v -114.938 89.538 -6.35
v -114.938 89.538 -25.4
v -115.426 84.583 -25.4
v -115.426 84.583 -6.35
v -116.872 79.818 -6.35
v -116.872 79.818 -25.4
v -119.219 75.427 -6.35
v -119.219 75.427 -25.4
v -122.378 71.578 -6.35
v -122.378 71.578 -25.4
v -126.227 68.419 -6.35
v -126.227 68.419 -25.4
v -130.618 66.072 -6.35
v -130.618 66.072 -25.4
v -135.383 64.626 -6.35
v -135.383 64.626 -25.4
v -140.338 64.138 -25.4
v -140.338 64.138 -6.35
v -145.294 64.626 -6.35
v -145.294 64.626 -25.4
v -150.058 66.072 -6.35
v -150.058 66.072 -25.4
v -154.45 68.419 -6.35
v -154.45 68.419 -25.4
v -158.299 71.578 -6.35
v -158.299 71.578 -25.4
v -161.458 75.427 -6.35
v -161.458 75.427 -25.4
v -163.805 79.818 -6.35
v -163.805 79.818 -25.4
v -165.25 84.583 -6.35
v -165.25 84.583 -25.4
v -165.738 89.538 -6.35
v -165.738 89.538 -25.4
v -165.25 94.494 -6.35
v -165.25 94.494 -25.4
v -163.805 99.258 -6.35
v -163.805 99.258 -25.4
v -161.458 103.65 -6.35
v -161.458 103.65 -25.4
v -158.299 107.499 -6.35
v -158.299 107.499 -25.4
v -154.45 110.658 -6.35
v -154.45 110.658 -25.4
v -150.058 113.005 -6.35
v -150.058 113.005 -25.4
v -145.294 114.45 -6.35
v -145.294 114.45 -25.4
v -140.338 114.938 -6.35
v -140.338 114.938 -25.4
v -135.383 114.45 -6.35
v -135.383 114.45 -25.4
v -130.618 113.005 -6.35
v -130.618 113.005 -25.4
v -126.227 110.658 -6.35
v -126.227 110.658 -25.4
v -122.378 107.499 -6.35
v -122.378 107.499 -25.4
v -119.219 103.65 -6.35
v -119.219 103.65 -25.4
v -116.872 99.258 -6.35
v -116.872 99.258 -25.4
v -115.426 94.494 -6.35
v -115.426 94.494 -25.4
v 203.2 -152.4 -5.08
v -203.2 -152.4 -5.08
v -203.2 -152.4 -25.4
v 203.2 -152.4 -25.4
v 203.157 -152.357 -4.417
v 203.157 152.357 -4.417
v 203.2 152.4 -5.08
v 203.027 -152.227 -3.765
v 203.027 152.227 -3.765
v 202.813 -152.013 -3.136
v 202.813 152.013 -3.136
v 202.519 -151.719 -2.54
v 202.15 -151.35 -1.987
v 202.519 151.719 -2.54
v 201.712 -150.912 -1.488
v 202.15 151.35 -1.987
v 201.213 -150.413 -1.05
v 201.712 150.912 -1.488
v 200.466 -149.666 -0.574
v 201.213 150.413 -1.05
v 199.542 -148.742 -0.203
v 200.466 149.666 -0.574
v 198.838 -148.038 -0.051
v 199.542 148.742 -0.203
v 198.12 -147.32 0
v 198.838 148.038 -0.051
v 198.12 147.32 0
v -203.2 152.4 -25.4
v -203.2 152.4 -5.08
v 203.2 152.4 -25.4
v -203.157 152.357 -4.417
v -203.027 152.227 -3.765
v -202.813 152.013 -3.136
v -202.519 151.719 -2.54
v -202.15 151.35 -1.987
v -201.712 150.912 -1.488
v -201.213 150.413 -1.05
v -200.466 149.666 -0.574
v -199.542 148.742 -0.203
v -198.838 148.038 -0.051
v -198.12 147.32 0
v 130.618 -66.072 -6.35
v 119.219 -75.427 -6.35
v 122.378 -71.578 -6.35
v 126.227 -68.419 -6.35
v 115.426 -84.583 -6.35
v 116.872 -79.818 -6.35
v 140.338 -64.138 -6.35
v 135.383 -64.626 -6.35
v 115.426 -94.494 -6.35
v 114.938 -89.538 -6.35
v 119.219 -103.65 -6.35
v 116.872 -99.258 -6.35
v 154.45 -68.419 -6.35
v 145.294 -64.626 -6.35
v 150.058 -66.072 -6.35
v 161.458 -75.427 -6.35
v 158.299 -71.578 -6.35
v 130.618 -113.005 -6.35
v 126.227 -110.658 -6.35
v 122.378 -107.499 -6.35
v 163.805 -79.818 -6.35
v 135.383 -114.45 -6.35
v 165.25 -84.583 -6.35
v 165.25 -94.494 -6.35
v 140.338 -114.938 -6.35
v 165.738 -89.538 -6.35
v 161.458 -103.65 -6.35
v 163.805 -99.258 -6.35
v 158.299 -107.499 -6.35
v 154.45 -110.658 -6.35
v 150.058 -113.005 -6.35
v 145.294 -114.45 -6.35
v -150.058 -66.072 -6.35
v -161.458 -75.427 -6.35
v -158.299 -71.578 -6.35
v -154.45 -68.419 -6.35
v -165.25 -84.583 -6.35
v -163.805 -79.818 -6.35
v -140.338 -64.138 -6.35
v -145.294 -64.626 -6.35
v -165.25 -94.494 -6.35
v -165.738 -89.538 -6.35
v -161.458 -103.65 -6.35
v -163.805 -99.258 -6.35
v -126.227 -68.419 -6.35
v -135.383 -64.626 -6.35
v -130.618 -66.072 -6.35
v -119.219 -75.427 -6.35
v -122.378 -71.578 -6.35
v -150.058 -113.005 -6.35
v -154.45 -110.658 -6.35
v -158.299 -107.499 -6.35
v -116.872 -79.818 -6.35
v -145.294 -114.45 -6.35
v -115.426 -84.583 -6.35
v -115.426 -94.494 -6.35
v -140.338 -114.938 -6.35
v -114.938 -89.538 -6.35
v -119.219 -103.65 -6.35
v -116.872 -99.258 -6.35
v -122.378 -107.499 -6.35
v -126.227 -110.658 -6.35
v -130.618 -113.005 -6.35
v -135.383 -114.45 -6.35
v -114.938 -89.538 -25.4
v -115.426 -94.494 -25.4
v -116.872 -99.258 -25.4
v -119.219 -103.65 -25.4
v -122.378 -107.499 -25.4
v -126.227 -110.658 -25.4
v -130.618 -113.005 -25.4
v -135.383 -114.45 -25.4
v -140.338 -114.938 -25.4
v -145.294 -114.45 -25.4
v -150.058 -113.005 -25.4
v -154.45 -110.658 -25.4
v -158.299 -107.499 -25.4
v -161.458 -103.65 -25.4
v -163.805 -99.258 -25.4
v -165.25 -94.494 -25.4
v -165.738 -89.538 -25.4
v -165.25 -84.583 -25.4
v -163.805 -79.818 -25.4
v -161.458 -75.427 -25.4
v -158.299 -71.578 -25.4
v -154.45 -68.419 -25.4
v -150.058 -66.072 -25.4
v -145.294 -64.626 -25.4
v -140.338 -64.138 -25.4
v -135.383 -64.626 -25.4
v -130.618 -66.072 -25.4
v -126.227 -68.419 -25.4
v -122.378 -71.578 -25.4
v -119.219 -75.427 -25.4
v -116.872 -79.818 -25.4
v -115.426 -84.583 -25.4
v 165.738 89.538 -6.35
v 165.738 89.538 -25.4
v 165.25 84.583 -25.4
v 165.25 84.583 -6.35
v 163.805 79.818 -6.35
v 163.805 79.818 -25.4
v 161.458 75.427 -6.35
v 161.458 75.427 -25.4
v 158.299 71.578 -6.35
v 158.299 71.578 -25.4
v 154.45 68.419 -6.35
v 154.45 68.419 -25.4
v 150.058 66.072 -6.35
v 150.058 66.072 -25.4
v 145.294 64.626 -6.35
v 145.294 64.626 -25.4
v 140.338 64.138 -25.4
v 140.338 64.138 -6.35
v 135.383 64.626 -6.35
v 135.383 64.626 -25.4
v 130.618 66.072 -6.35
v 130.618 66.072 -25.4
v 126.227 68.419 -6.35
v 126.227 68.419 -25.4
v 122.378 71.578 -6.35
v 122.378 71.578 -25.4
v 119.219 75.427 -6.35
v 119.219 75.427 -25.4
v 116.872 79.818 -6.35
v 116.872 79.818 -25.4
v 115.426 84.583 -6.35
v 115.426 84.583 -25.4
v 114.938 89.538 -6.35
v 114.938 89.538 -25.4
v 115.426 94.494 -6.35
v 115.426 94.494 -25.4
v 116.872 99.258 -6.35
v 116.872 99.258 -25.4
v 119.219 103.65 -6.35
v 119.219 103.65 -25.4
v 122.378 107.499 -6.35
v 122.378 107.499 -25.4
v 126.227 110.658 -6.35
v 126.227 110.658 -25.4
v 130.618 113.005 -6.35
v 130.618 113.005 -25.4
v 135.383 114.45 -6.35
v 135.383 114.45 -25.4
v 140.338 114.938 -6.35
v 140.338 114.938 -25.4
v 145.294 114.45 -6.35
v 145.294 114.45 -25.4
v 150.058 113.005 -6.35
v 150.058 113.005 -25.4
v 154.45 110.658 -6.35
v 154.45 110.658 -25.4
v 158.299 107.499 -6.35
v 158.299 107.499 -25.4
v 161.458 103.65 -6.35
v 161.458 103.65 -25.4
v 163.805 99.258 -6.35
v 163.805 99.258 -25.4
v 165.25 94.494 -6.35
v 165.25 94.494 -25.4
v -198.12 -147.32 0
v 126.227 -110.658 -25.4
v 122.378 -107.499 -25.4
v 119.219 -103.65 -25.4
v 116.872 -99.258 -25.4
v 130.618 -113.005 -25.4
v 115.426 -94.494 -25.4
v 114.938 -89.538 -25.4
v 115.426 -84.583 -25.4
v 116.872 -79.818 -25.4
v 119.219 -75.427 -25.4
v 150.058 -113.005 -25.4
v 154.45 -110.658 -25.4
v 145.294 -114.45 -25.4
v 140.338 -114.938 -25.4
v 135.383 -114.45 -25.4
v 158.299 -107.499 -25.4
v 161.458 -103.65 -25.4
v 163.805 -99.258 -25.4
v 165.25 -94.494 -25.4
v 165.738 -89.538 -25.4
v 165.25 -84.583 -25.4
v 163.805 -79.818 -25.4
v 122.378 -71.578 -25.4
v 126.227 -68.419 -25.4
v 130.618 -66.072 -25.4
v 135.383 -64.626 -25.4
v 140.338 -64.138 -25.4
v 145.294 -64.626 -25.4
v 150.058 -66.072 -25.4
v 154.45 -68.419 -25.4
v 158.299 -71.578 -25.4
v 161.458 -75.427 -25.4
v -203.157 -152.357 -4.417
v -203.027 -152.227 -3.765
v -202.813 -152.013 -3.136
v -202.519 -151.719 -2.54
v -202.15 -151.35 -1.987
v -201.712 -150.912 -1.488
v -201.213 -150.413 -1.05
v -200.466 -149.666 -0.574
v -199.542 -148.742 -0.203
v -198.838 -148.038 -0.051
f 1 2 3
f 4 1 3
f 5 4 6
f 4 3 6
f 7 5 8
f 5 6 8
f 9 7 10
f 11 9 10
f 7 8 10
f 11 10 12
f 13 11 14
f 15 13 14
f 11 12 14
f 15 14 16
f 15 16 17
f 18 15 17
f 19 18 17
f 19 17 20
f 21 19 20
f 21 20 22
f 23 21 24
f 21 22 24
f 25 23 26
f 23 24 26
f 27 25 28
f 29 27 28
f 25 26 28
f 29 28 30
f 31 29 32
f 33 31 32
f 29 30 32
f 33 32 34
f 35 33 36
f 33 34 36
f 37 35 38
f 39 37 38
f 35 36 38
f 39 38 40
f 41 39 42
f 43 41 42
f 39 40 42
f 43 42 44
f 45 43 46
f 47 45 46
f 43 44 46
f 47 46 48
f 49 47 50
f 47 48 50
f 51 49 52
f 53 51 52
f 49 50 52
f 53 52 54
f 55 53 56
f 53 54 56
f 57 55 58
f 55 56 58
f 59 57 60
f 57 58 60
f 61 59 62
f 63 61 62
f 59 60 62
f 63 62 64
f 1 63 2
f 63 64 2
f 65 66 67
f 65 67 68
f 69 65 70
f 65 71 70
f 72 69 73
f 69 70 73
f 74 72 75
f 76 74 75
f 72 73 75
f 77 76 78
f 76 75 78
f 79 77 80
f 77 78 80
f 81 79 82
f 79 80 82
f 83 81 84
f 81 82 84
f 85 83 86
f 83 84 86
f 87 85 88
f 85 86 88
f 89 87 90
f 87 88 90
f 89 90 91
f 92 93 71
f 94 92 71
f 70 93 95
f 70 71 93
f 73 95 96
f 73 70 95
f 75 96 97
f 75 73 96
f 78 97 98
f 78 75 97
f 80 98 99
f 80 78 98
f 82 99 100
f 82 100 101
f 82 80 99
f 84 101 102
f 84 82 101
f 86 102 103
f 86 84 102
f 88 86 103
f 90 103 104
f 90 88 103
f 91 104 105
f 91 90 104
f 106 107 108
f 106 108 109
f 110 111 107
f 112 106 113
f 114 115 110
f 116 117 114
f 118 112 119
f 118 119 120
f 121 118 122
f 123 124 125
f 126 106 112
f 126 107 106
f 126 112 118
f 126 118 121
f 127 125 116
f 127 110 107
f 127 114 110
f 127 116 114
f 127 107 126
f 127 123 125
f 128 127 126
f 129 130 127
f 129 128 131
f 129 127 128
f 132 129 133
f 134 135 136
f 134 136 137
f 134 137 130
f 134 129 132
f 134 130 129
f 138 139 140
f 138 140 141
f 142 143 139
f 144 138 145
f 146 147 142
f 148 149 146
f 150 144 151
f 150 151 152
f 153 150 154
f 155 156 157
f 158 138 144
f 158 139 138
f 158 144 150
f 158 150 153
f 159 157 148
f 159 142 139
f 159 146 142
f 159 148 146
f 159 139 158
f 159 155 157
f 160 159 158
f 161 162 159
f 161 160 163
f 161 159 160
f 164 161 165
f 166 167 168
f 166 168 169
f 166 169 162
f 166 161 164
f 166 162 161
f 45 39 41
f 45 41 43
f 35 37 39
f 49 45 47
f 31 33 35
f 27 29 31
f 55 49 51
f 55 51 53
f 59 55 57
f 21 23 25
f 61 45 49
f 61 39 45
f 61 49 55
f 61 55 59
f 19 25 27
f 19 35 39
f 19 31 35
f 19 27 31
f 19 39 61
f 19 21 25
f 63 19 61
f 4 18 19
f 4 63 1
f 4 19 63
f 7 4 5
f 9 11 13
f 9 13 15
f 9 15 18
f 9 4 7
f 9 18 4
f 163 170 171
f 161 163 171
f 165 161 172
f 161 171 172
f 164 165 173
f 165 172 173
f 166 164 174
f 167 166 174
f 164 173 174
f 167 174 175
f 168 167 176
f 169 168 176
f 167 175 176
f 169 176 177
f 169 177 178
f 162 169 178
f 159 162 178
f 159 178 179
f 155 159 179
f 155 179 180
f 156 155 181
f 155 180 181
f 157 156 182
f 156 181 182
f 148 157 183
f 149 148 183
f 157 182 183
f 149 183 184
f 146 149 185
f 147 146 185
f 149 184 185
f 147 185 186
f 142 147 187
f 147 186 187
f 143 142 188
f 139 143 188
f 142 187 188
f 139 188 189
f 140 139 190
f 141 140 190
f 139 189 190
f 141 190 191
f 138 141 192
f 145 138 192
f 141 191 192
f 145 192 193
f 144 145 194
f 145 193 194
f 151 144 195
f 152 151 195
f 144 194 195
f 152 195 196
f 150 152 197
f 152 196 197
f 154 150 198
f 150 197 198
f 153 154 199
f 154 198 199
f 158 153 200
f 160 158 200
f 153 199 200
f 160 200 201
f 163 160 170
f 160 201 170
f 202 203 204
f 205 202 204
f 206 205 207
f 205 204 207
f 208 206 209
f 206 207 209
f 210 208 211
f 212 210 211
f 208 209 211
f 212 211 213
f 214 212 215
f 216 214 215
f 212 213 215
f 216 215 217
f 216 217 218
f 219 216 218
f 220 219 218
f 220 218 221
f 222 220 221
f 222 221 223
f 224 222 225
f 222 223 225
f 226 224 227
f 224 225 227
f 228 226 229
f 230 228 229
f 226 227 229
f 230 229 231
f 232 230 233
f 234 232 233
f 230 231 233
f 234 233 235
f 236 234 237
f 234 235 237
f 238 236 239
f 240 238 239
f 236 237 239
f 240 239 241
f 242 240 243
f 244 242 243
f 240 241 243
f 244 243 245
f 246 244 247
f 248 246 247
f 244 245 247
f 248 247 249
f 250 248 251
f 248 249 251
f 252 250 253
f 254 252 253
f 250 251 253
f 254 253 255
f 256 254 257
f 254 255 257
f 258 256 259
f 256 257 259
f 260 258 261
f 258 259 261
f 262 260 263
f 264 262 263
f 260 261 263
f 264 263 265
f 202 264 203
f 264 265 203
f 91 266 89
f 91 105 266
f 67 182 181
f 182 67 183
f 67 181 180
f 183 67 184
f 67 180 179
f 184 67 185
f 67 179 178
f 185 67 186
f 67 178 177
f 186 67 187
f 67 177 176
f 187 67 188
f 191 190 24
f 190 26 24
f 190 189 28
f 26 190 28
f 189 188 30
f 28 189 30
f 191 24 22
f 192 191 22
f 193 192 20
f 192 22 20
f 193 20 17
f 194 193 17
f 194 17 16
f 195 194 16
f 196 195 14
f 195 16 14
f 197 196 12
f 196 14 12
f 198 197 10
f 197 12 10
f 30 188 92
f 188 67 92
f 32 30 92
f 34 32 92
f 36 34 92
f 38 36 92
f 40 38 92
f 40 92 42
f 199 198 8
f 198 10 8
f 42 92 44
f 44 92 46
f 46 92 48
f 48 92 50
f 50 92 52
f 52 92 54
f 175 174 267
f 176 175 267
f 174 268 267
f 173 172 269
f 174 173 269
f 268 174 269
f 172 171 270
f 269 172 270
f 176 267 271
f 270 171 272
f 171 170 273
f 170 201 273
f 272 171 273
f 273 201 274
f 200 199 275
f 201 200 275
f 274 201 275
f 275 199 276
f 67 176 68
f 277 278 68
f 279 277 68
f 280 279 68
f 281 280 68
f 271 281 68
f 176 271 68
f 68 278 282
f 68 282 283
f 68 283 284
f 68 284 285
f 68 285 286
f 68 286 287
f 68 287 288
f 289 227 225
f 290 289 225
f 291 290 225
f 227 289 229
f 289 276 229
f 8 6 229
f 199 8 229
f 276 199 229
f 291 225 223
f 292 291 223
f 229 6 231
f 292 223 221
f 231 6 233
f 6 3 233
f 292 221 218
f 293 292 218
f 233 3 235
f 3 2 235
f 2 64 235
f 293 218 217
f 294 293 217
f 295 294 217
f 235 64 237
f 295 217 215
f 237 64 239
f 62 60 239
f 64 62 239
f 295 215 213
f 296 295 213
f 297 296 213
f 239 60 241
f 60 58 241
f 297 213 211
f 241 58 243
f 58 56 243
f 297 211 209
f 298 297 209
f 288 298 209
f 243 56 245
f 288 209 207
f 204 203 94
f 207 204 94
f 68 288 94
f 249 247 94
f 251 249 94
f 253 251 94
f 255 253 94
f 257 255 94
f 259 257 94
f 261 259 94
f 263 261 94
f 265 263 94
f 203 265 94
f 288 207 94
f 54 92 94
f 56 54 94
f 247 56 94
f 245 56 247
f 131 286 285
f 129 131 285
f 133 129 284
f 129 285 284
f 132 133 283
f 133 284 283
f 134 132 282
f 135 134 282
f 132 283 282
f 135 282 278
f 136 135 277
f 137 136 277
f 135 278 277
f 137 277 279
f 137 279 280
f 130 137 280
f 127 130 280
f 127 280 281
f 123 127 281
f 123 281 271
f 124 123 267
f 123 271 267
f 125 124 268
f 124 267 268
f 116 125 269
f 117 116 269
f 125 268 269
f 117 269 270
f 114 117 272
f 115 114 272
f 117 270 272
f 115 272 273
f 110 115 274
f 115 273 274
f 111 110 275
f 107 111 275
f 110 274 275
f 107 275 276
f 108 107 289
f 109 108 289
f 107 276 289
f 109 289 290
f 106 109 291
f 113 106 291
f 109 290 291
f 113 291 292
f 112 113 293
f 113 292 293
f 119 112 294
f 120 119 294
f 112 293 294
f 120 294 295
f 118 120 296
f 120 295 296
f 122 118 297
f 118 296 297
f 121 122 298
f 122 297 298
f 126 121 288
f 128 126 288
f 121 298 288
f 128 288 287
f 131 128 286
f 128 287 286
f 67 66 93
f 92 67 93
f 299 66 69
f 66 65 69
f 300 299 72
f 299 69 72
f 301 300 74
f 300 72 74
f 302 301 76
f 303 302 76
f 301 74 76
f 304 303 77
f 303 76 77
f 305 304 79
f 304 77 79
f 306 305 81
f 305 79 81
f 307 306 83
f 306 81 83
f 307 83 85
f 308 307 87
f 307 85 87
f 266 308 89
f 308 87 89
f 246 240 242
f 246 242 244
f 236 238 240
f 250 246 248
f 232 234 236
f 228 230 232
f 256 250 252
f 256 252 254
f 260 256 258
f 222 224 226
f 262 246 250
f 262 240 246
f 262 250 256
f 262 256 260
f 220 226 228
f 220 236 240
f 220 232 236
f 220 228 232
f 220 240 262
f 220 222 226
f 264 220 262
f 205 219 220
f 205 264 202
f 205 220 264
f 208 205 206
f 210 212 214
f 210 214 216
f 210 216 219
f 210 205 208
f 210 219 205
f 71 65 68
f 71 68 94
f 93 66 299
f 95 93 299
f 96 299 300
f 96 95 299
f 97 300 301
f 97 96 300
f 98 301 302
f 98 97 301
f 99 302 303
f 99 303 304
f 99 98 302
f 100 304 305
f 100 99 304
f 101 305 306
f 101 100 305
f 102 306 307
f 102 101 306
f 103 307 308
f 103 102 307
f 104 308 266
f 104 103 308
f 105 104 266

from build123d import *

# Parameters (mm, degrees)
F0_W     = 406.4
F0_H     = 304.8
F1_DEPTH = 25.4
F2_R     = 5.08
F3_R     = 25.4
F4_DEPTH = 19.05


with BuildPart() as f1:
    # F0 (on Top) → F1 (new body)
    with BuildSketch(Plane.XY):
        Rectangle(F0_W, F0_H)
    extrude(amount=-F1_DEPTH)

    # F2
    f2_edges = [f1.edges().sort_by_distance(p)[0] for p in [
        (0, -152.4, 0),
        (203.2, 0, 0),
        (0, 152.4, 0),
        (-203.2, 0, 0),
    ]]
    fillet(f2_edges, radius=F2_R)

    # F3 (on face) → F4 (cut)
    with BuildSketch(Plane(origin=(0, 0, -25.4), x_dir=(1, 0, 0), z_dir=(0, 0, -1))):
        with Locations((-140.338207, 89.538207)):
            Circle(F3_R)
        with Locations((140.338207, 89.538207)):
            Circle(F3_R)
        with Locations((-140.338207, -89.538207)):
            Circle(F3_R)
        with Locations((140.338207, -89.538207)):
            Circle(F3_R)
    extrude(amount=-F4_DEPTH, mode=Mode.SUBTRACT)


solid = f1.part
